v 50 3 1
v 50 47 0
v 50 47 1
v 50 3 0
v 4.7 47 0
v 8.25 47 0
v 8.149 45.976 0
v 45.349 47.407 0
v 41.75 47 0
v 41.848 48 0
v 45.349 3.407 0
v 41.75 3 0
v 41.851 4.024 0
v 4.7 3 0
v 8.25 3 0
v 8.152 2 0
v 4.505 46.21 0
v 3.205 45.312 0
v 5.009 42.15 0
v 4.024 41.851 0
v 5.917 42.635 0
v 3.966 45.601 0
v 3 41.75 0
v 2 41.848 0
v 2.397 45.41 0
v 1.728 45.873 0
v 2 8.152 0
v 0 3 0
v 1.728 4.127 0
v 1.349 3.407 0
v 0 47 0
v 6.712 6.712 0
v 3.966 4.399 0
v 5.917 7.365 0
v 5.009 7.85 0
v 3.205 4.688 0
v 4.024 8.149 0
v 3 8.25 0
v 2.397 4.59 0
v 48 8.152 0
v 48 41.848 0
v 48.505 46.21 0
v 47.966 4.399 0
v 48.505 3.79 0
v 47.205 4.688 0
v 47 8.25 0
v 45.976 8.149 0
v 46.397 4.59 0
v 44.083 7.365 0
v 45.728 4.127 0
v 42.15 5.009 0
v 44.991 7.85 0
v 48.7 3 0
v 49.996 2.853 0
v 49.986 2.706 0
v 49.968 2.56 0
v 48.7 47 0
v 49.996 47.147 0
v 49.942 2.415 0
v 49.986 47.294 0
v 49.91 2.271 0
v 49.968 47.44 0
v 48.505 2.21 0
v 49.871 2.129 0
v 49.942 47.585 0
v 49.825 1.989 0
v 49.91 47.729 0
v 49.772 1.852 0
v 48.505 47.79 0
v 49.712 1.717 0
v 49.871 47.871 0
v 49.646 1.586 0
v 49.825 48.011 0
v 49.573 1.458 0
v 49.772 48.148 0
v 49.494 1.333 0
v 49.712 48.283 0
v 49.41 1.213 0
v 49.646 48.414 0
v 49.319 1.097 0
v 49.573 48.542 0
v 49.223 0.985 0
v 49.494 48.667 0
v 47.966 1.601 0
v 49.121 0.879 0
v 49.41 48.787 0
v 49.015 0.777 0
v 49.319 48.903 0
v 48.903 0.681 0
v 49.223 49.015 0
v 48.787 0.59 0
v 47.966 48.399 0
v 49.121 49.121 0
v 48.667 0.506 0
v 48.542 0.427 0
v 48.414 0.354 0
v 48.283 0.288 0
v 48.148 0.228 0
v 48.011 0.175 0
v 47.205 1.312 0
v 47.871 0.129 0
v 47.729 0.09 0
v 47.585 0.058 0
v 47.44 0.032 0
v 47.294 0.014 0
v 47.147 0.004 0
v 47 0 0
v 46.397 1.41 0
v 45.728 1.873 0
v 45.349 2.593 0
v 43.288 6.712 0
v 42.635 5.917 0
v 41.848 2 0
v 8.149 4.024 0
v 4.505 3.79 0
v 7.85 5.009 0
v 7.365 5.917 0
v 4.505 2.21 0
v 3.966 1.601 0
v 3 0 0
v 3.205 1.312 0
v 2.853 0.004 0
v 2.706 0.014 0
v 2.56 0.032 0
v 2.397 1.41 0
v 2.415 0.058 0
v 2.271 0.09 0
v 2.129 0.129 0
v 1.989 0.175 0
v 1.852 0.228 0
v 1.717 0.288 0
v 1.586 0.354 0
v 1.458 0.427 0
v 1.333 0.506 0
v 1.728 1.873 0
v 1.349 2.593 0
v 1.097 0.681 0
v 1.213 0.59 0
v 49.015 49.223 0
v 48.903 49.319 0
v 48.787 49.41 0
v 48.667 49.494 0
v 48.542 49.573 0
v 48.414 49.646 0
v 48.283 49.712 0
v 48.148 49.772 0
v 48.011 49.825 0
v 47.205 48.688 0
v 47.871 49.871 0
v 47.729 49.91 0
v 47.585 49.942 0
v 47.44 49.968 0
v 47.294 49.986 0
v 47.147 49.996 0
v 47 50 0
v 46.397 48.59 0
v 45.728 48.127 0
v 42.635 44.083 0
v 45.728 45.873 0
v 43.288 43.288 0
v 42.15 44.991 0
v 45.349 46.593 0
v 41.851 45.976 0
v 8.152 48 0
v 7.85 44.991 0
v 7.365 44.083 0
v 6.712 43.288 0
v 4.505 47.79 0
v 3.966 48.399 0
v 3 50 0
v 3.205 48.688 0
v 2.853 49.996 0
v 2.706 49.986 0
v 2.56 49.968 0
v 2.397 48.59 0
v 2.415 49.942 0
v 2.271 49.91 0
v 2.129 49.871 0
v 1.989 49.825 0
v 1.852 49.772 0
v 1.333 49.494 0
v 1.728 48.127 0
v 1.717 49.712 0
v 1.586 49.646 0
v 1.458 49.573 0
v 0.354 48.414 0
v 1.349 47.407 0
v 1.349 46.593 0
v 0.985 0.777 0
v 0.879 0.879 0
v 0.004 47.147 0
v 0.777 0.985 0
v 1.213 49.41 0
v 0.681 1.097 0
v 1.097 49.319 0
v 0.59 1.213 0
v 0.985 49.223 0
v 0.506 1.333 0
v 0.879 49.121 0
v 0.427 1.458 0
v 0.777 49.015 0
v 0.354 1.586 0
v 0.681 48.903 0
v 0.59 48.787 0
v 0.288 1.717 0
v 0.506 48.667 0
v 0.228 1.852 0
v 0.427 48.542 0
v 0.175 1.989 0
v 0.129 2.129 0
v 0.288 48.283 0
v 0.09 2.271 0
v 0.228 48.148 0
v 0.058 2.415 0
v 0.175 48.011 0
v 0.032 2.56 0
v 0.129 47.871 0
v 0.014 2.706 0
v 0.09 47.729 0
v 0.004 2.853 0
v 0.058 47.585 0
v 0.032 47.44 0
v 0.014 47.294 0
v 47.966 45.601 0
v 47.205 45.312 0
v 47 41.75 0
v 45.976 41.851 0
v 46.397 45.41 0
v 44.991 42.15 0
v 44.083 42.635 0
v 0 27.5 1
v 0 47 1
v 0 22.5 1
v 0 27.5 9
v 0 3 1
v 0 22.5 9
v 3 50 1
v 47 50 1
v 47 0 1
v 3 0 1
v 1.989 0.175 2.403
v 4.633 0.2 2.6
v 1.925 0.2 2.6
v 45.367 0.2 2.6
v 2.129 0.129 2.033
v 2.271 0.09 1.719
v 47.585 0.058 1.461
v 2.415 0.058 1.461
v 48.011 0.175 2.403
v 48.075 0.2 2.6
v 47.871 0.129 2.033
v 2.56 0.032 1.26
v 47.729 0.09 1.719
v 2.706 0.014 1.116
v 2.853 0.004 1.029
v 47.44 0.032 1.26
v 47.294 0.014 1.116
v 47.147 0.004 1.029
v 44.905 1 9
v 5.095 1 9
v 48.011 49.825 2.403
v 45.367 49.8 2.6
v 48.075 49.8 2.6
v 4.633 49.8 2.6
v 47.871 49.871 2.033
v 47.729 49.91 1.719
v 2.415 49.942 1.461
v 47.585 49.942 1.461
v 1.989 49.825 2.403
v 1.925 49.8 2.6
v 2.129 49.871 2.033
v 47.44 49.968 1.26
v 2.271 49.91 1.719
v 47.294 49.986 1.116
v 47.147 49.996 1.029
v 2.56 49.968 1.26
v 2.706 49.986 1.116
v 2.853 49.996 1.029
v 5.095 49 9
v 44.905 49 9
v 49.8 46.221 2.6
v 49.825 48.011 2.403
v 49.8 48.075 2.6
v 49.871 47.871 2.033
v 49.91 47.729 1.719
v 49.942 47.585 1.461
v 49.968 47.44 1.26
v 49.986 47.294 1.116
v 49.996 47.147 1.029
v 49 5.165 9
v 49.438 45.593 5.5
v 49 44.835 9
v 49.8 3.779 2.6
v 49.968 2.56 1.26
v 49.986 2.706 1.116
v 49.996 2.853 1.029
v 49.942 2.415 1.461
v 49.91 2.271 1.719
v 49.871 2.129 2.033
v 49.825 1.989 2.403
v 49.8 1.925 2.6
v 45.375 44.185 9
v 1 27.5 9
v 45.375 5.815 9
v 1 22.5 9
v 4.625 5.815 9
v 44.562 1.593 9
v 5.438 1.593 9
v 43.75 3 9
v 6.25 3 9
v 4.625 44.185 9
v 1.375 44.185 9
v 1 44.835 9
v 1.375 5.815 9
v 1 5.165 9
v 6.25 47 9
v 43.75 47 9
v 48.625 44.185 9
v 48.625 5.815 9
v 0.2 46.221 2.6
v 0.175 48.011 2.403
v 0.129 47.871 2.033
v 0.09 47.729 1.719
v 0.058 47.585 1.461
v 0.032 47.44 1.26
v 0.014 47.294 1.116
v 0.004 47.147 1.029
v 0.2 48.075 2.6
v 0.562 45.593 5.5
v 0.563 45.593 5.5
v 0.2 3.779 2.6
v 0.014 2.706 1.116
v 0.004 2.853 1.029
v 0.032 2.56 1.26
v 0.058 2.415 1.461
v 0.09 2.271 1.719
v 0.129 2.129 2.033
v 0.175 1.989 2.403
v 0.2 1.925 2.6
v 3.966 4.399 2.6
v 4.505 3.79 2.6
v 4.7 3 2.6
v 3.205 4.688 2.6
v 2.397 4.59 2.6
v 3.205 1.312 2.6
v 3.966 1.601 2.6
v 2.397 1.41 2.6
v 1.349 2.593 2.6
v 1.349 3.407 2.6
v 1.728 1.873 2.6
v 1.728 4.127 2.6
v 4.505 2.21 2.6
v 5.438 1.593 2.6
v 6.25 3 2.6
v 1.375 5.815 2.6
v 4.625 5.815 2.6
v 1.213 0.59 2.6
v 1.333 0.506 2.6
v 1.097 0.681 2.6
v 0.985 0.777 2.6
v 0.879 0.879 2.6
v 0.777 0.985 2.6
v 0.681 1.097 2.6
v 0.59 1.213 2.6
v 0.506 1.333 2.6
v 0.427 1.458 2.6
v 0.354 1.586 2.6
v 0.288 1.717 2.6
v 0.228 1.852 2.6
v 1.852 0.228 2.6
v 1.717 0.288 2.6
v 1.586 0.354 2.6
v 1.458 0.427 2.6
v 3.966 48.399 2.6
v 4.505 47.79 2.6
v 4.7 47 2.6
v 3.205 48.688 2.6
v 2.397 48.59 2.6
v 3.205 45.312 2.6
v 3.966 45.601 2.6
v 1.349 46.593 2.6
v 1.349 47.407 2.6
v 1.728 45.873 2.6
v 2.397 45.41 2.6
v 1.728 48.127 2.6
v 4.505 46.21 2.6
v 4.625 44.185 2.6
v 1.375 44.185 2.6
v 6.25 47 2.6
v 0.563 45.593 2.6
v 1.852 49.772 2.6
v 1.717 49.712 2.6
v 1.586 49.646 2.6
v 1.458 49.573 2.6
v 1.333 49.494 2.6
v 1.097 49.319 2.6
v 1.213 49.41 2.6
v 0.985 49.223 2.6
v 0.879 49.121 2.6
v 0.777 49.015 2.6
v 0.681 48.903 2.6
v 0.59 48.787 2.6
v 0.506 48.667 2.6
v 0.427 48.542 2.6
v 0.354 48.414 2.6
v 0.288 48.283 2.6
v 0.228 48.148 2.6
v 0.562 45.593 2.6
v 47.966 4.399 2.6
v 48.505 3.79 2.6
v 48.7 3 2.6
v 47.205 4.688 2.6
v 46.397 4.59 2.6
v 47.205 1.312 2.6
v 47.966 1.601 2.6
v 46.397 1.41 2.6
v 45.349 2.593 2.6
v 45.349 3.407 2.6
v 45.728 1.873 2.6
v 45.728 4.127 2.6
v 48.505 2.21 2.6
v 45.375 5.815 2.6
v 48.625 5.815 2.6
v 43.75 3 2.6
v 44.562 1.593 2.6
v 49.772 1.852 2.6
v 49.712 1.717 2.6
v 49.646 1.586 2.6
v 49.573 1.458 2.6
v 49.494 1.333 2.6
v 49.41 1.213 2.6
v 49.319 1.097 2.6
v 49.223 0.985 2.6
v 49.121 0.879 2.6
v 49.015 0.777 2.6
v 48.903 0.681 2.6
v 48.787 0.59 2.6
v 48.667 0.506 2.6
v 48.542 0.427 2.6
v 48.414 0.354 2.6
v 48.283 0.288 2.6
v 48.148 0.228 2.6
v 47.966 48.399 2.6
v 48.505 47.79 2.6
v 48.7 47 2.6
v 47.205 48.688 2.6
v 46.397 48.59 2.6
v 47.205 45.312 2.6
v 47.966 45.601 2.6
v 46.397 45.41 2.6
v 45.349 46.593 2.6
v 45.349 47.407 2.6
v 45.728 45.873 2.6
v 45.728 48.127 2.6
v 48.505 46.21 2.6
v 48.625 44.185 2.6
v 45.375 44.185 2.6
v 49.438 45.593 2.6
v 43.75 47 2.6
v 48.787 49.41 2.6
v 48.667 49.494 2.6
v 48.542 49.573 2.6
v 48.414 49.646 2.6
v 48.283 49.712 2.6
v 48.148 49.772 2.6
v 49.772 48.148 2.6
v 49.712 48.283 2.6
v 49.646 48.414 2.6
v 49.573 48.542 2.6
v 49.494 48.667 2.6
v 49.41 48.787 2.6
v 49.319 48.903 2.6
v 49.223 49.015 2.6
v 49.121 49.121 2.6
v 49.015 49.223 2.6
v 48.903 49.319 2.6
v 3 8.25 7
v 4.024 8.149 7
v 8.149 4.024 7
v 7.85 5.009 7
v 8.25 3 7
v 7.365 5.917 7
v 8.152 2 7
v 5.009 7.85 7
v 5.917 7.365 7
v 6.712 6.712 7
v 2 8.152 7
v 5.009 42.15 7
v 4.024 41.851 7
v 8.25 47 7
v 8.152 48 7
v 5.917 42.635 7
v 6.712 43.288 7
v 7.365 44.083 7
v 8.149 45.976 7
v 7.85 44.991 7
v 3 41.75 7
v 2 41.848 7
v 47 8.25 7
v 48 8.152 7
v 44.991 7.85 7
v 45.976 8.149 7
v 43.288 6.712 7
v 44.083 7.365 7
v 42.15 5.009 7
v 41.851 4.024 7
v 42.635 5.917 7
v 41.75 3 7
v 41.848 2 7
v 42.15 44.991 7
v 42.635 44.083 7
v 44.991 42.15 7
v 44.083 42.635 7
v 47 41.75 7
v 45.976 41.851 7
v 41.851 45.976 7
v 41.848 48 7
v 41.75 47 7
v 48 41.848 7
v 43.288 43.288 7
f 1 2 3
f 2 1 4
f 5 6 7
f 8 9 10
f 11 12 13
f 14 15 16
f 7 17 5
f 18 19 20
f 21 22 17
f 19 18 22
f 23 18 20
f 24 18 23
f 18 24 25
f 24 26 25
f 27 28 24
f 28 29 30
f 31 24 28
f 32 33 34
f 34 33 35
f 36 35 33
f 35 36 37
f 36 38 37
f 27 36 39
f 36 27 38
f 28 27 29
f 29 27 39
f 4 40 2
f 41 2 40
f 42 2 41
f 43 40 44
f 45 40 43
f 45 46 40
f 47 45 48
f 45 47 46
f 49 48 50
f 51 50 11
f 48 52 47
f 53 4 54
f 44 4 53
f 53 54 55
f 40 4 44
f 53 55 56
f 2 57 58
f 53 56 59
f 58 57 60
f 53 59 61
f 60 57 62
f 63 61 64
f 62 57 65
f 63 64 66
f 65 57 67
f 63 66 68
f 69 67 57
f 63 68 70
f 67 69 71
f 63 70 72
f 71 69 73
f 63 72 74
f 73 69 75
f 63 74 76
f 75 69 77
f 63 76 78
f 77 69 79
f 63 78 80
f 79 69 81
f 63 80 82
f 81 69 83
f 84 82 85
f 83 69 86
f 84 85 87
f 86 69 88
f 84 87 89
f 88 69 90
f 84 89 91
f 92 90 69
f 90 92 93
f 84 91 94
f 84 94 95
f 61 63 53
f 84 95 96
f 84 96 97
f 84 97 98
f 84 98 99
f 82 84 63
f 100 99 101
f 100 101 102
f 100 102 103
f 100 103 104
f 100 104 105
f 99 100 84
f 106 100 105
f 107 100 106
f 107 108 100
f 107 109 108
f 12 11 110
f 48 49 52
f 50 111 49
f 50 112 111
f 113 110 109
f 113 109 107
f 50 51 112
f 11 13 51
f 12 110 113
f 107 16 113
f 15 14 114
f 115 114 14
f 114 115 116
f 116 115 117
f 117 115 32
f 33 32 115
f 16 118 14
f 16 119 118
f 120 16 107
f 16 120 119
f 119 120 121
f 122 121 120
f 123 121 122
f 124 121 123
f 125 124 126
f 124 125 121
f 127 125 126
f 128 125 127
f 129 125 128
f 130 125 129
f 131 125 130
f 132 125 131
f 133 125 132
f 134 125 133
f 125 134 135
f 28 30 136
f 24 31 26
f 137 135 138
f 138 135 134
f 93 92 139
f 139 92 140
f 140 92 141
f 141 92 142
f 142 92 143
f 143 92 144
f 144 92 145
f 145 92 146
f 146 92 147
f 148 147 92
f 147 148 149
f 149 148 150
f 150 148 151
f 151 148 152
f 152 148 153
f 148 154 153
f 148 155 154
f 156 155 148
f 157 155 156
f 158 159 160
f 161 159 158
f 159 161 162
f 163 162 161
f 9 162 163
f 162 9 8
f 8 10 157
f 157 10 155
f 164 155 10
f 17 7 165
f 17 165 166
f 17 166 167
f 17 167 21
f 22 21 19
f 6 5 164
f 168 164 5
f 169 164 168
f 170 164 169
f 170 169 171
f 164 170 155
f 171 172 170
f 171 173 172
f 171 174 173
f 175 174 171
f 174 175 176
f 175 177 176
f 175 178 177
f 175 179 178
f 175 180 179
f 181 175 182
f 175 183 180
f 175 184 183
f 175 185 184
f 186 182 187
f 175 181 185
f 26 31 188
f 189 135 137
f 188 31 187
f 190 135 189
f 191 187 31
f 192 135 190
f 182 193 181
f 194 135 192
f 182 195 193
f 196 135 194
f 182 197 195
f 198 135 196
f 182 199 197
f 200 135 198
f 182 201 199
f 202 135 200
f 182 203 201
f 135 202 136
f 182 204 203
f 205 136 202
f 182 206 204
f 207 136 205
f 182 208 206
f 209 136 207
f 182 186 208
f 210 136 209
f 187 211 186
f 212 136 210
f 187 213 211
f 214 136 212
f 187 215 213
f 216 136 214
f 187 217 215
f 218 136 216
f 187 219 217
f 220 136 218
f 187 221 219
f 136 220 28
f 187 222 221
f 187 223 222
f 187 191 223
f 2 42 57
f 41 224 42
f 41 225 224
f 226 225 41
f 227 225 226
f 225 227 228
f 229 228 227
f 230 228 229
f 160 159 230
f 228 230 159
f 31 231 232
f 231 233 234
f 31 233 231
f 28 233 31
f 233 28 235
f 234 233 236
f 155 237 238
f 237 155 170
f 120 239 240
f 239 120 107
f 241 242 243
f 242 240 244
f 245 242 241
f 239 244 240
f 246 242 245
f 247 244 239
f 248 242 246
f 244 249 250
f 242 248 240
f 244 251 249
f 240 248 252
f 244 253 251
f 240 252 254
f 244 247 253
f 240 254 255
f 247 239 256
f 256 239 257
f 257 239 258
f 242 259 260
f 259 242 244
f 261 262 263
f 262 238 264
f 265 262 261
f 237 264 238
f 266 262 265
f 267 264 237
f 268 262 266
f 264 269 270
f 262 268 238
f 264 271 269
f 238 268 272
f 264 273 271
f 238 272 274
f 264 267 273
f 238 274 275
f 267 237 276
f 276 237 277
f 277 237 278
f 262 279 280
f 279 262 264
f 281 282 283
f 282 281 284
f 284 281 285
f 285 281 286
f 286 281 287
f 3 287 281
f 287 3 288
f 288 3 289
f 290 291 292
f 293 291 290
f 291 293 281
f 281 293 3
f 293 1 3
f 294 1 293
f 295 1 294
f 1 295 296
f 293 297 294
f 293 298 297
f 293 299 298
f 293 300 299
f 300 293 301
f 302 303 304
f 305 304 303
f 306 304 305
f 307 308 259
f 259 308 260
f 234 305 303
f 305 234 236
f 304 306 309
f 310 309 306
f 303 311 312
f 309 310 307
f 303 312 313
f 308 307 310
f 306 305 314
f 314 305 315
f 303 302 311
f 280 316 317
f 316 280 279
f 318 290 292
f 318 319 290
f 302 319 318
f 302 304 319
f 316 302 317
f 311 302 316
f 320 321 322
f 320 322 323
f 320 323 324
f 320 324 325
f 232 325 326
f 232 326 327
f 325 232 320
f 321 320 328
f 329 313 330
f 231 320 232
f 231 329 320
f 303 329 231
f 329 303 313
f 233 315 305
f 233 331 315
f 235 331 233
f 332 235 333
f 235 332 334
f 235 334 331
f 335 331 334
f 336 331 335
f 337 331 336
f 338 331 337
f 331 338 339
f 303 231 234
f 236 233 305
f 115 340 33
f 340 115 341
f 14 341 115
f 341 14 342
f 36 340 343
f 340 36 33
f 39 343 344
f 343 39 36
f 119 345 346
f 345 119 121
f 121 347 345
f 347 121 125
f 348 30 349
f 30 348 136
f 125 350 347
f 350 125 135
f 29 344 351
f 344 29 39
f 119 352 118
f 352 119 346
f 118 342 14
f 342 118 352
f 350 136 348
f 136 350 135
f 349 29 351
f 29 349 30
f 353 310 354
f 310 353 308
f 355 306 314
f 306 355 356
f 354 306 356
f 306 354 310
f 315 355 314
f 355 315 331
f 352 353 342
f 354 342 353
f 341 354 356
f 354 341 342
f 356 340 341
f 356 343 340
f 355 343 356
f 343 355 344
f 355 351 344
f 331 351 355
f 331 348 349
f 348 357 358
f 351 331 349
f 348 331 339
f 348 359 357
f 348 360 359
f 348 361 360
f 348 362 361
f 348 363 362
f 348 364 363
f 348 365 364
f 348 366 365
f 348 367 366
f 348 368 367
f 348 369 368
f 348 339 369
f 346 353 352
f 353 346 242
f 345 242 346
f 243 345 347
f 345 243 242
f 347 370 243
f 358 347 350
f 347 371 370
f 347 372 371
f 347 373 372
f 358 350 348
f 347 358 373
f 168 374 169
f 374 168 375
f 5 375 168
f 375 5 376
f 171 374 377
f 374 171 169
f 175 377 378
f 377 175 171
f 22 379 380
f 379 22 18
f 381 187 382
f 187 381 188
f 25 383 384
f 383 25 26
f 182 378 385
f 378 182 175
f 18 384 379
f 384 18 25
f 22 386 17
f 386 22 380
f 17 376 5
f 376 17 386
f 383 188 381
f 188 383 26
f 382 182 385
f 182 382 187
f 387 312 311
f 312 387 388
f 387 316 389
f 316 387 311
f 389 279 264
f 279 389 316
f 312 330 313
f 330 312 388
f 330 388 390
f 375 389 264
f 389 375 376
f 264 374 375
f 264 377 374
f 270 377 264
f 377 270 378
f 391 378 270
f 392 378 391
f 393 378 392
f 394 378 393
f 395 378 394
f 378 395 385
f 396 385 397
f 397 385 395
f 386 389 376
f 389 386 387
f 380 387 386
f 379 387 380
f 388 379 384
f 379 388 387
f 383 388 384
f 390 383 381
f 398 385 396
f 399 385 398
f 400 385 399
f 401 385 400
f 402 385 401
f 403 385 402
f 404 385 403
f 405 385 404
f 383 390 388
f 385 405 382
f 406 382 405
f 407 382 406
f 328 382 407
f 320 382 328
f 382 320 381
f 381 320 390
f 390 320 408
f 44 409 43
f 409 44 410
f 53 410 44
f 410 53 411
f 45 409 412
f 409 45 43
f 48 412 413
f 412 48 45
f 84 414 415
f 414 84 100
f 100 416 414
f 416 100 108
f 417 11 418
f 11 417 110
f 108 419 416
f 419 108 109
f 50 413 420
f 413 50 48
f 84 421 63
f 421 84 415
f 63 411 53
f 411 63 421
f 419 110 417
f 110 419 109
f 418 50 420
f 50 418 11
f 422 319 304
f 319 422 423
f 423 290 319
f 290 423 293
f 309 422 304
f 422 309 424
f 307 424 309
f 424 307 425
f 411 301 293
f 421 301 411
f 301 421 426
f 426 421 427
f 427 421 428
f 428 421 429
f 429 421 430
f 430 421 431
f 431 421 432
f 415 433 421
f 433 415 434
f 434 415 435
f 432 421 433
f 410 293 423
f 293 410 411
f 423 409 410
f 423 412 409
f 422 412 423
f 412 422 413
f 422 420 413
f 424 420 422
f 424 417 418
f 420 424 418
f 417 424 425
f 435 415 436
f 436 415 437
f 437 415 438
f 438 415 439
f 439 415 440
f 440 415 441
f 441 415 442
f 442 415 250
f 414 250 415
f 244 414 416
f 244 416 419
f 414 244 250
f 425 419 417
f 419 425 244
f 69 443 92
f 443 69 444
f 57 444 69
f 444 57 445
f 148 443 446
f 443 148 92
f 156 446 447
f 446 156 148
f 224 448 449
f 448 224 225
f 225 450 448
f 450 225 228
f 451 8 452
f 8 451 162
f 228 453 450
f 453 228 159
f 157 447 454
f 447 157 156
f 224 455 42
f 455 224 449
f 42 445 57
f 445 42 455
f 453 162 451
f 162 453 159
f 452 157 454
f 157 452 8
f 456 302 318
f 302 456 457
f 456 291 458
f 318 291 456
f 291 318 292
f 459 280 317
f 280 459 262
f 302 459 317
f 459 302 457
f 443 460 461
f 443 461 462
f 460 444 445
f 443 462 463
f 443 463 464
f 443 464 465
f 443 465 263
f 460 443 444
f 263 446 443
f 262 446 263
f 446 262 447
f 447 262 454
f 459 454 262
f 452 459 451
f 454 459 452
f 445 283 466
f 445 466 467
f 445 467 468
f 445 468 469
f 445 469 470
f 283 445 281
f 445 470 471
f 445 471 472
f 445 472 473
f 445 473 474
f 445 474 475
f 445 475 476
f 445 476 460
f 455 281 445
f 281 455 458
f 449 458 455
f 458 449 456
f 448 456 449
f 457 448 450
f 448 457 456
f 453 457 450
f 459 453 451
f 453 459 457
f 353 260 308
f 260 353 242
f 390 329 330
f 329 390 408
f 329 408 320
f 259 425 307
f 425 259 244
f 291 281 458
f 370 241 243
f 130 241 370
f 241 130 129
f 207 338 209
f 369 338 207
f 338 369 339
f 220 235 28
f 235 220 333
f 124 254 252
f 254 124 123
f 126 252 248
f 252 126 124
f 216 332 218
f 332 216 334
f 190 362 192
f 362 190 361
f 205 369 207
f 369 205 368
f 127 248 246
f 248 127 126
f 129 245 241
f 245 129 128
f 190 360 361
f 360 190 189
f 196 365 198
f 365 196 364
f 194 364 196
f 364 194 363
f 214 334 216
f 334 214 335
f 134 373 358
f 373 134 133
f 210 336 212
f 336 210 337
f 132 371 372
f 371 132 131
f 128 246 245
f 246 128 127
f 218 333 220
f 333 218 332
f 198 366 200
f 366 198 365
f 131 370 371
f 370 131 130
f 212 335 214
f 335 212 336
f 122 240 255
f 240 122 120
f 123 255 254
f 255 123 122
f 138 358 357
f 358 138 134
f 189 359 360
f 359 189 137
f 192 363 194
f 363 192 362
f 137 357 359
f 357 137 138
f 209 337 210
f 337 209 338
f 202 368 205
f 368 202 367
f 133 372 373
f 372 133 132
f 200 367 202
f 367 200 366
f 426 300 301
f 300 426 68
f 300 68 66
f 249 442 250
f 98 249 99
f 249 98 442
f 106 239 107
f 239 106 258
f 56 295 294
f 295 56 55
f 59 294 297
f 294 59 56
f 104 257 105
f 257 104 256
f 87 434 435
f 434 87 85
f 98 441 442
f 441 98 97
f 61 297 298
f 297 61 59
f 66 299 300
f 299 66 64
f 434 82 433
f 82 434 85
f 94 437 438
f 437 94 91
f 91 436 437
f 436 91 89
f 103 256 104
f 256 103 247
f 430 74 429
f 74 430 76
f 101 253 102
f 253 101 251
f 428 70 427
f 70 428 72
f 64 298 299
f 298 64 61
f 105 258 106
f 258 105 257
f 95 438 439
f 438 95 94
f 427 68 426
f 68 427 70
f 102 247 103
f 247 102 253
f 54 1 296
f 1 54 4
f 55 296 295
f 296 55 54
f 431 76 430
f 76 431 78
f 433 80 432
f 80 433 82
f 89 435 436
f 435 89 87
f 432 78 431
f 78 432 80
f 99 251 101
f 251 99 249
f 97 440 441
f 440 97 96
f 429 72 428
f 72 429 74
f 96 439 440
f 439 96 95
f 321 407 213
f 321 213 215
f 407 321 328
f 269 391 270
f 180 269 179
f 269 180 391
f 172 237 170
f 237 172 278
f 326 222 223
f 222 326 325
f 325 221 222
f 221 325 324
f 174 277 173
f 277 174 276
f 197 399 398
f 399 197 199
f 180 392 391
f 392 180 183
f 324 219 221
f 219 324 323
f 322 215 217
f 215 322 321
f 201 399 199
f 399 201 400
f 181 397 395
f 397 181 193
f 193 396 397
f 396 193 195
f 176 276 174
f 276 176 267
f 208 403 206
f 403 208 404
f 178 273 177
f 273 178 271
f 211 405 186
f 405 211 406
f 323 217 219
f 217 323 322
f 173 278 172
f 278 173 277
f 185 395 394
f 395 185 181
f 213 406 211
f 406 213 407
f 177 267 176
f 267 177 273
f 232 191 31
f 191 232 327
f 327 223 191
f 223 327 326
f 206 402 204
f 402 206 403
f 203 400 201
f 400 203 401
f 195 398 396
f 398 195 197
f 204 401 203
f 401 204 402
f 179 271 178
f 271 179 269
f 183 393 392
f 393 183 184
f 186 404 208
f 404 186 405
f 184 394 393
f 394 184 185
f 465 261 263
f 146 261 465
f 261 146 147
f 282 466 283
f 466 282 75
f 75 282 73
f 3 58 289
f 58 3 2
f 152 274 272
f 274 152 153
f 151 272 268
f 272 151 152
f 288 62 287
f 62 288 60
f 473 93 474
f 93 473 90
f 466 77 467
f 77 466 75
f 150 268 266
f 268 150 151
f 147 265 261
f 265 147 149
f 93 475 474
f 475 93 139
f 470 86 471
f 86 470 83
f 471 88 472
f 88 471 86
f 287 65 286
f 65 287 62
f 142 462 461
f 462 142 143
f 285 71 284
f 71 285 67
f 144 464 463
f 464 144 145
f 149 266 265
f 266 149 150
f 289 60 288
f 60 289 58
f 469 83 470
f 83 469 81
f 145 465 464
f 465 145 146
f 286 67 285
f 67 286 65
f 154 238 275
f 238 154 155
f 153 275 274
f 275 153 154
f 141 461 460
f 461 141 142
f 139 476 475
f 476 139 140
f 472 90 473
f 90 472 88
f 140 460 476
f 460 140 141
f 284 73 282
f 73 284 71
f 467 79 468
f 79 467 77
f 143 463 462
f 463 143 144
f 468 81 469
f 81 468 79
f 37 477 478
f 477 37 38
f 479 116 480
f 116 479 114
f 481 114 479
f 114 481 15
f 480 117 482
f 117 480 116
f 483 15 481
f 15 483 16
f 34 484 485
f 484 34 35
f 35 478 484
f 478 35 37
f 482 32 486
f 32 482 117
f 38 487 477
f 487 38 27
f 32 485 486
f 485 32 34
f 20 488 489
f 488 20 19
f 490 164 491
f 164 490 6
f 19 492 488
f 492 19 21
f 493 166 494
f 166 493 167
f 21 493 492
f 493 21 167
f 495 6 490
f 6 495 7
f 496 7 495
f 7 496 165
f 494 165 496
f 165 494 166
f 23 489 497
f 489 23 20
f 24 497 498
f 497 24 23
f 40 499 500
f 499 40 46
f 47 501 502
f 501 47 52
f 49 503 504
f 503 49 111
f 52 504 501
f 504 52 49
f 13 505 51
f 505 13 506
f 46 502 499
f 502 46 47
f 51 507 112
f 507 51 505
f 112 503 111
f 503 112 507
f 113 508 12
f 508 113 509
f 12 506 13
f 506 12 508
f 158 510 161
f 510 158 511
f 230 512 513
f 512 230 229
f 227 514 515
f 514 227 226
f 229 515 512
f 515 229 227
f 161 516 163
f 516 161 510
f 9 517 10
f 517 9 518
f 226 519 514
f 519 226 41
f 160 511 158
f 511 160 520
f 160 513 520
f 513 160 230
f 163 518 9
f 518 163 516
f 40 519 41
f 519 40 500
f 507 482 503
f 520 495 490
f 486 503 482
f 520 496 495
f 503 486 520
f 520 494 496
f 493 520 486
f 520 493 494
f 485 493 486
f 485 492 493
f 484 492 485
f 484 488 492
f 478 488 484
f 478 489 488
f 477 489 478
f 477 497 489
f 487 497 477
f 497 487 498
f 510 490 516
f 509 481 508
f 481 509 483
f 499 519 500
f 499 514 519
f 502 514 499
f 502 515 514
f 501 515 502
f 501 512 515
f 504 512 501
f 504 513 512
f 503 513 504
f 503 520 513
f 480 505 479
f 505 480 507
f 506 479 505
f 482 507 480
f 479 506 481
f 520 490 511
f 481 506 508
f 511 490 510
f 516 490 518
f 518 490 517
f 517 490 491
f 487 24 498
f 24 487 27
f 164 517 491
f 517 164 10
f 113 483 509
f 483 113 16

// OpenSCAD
// file: ../lib/utils.scad
module clearance_hole(d, h=100, clearance=0.2, e=0.1) {
	cylinder(r=(d+clearance)/2, h=h+e, $fn=min(64, 4 + 3*d));
}

module z_fillet(r=5, h=100, e=0.1) {
	difference() {
	translate([0-e, 0-e, 0])
		cube([r+e, r+e, h]);
	translate([r, r, 0-e])
		cylinder(r=r, h=h+e+e, $fn=$fn*4);
	}
}

module hexagonal_prism(d_flat=8, h=10) {
    r = d_flat / sqrt(3); // Circumradius
    cylinder(h=h, r=r, $fn=6);
}

module grip_texture(length, depth, height) {
	n = floor(length/depth); // TODO: number of teeth
	e = 0.1;
	xOffset = (length - depth*n)/2;
	difference() {
		translate([0, 0-e, 0-e])
		cube([length, depth+e, height+e+e]);
		for (i = [0:n]) {
			translate([i*depth*2 - xOffset, depth, 0-e])
			cylinder(r=depth, h=height+e+e, $fn=4);
		}
	}
}

module lanyard_loop(length=30, width=8, height=10, overflow=0, slotDiameter=5) {
	e=0.1;
	wall = (height - slotDiameter)/2;
	assert(wall > 0, "slotDiameter too large for lanyard loop");
	difference() {
		union() {
			translate([0-overflow, 0, 0])
			cube([height+overflow, length, width]);
			translate([0, length, 0])
				z_fillet(height/2, h=width);
		}
		translate([height, 0, 0-e])
		rotate([0, 0, 90])
		z_fillet(height/2);
		translate([height, length, 0-e])
		rotate([0, 0, 180])
		z_fillet(height/2);

		// slot
		slotLength = length - wall*3 - slotDiameter;
		translate([wall, wall, 0-e])
			round_rect(size=[slotDiameter, slotLength, width+e+e], r=slotDiameter/2);
		translate([height/2, length - slotDiameter/2 - wall, 0-e])
		cylinder(r=slotDiameter/2, h=width+e+e);
	}
}

module round_rect(size=[10, 10, 10], r=1) {
	difference() {
		cube(size);
		if (r > 0) {
			for (i = [[0,0,0], [1,0,90], [1,1,180], [0,1,270]]) {
				translate([i[0]*size[0], i[1]*size[1], -.1])
				rotate([0, 0, i[2]])
					z_fillet(r, h=size[2]+0.2);
			}
		}
	}
}

function mounting_bolts(length, width, holeOffset) = [
	[ holeOffset, holeOffset],
	[ holeOffset, width - holeOffset],
	[ length - holeOffset, holeOffset],
	[ length - holeOffset, width - holeOffset]
];

function hexWrenchSize(width) = width / 2 * sqrt(3);
// file: ../cover.scad
use <lib/utils.scad>;

module case_cover(
	length=47,
	width=50,
	thickness=4,
	hex=false,
	topThickness = 2,
	counterboreDepth=3,
	counterboreDiameter=8) {

	bottomThickness = 1;
	mountHoleOffset = 3; // must match the value in case_frame
	mountHoleSize = 3.2;
	draftOffset = 1;
	wallThickness = 2;
	wrenchSize = hexWrenchSize(counterboreDiameter);
	echo("Counterbore size: ", counterboreDiameter, "\n");
	echo("Wrench size: ", wrenchSize, "\n");
	e = 0.1; // small waste number; not for final geometry

	assert(thickness >= (counterboreDepth+bottomThickness), "case_cover thickness is too small");

	difference() {
		union() {
			cube([
				length,
				width,
				bottomThickness
			]);
			translate([0, 0, bottomThickness])
				truncated_pyramid(length=length, width=width, height=thickness-bottomThickness, inset=draftOffset);

			// Feet - for stability
			footWidth = 5;
			translate([0, (width - footWidth)/2, 0])
				cube([ length/2, footWidth, thickness]);

		}

		for (
			position = mounting_bolts(length, width, mountHoleOffset)
		) {
			translate([position[0], position[1], 0]) {
				clearance_hole(mountHoleSize);
				translate([0,0, thickness - counterboreDepth])
				if (hex) {
					cylinder(r=counterboreDiameter/2, h=counterboreDepth+e+e, $fn=6);
				} else {
					clearance_hole(counterboreDiameter, counterboreDepth+e);
				}
			}
		}

		// Remove corner material if hex
		if (hex) {
			positions = mounting_bolts(length, width, mountHoleOffset);
			hexCornerDifference( // bottom-right
				position=positions[0],
				angle=-120,
				width=wrenchSize,
				depth=counterboreDepth,
				thickness=thickness
			);
			hexCornerDifference( // bottom-left
				position=positions[1],
				angle=120,
				width=wrenchSize,
				depth=counterboreDepth,
				thickness=thickness
			);
			hexCornerDifference( // top-right
				position=positions[2],
				angle=300,
				width=wrenchSize,
				depth=counterboreDepth,
				thickness=thickness
			);
			hexCornerDifference( // top-left
				position=positions[3],
				angle=60,
				width=wrenchSize,
				depth=counterboreDepth,
				thickness=thickness
			);
		}

		// Corner Radiuses
		translate([0, 0, 0-e])          rotate([0, 0, 0])    z_fillet(3);
		translate([length, 0, 0-e])     rotate([0, 0, 90])   z_fillet(3);
		translate([0, width, 0-e])      rotate([0, 0, 270])  z_fillet(3);
		translate([length, width, 0-e]) rotate([0, 0, 180])  z_fillet(3);

		// Inner cavity
		difference() {
			translate([
				wallThickness,
				wallThickness,
				0-e
			])
			cube([
				length - 2*wallThickness,
				width - 2*wallThickness,
				thickness - topThickness + e
			]);

			for (position = mounting_bolts(length, width, mountHoleOffset)) {
				translate([position[0], position[1], 0-e]) {
					innerCavityRadius = max((counterboreDiameter/2)+topThickness,wallThickness);
					cylinder(r=innerCavityRadius, h=thickness-topThickness+e+e);
				}
			}
		}
	}

}

module hexCornerDifference(
	position,
	angle,
	width,
	depth,
	thickness
) {
	length=100; // any long enough number
	translate([position[0], position[1], 0])
	rotate([0,0,angle])
	translate([0, 0-width/2, thickness-depth])
		cube([length, width, depth]);
}

module truncated_pyramid(length, width, height, inset=5) {
	polyhedron(
		points=[
			[0      , 0     , 0]      , // 0
			[length , 0     , 0]      , // 1
			[length , width , 0]      , // 2
			[0      , width , 0]      , // 3

			[inset        , inset       , height] , // 4
			[length-inset , inset       , height] , // 5
			[length-inset , width-inset , height] , // 6
			[inset        , width-inset , height] , // 7
		],
		faces=[
			[1, 0, 4],
			[4, 5, 1],
			[2, 1, 5],
			[5, 6, 2],
			[3, 2, 6],
			[6, 7, 3],
			[0, 3, 7],
			[7, 4, 0],
			[7, 6, 5],
			[4, 7, 5],
			[0, 1, 3],
			[1, 2, 3],
		],
		convexity=1
	);
}

case_cover($fn=32);
// main file
use <../cover.scad>;

width             = 50;
length            = 50;
topThickness      = 2;
batteryThickness  = 7;
thickness         = topThickness+batteryThickness;
fastenerThickness = 2.6; // thickness at the fasteners

case_cover(
	length=length,
	width=width,
	thickness=thickness,
	topThickness=topThickness,
	hex=true,
	counterboreDepth=(thickness-fastenerThickness),
	counterboreDiameter=6.5,  // wrench size of an M3 + clearance
	$fn=32
);
